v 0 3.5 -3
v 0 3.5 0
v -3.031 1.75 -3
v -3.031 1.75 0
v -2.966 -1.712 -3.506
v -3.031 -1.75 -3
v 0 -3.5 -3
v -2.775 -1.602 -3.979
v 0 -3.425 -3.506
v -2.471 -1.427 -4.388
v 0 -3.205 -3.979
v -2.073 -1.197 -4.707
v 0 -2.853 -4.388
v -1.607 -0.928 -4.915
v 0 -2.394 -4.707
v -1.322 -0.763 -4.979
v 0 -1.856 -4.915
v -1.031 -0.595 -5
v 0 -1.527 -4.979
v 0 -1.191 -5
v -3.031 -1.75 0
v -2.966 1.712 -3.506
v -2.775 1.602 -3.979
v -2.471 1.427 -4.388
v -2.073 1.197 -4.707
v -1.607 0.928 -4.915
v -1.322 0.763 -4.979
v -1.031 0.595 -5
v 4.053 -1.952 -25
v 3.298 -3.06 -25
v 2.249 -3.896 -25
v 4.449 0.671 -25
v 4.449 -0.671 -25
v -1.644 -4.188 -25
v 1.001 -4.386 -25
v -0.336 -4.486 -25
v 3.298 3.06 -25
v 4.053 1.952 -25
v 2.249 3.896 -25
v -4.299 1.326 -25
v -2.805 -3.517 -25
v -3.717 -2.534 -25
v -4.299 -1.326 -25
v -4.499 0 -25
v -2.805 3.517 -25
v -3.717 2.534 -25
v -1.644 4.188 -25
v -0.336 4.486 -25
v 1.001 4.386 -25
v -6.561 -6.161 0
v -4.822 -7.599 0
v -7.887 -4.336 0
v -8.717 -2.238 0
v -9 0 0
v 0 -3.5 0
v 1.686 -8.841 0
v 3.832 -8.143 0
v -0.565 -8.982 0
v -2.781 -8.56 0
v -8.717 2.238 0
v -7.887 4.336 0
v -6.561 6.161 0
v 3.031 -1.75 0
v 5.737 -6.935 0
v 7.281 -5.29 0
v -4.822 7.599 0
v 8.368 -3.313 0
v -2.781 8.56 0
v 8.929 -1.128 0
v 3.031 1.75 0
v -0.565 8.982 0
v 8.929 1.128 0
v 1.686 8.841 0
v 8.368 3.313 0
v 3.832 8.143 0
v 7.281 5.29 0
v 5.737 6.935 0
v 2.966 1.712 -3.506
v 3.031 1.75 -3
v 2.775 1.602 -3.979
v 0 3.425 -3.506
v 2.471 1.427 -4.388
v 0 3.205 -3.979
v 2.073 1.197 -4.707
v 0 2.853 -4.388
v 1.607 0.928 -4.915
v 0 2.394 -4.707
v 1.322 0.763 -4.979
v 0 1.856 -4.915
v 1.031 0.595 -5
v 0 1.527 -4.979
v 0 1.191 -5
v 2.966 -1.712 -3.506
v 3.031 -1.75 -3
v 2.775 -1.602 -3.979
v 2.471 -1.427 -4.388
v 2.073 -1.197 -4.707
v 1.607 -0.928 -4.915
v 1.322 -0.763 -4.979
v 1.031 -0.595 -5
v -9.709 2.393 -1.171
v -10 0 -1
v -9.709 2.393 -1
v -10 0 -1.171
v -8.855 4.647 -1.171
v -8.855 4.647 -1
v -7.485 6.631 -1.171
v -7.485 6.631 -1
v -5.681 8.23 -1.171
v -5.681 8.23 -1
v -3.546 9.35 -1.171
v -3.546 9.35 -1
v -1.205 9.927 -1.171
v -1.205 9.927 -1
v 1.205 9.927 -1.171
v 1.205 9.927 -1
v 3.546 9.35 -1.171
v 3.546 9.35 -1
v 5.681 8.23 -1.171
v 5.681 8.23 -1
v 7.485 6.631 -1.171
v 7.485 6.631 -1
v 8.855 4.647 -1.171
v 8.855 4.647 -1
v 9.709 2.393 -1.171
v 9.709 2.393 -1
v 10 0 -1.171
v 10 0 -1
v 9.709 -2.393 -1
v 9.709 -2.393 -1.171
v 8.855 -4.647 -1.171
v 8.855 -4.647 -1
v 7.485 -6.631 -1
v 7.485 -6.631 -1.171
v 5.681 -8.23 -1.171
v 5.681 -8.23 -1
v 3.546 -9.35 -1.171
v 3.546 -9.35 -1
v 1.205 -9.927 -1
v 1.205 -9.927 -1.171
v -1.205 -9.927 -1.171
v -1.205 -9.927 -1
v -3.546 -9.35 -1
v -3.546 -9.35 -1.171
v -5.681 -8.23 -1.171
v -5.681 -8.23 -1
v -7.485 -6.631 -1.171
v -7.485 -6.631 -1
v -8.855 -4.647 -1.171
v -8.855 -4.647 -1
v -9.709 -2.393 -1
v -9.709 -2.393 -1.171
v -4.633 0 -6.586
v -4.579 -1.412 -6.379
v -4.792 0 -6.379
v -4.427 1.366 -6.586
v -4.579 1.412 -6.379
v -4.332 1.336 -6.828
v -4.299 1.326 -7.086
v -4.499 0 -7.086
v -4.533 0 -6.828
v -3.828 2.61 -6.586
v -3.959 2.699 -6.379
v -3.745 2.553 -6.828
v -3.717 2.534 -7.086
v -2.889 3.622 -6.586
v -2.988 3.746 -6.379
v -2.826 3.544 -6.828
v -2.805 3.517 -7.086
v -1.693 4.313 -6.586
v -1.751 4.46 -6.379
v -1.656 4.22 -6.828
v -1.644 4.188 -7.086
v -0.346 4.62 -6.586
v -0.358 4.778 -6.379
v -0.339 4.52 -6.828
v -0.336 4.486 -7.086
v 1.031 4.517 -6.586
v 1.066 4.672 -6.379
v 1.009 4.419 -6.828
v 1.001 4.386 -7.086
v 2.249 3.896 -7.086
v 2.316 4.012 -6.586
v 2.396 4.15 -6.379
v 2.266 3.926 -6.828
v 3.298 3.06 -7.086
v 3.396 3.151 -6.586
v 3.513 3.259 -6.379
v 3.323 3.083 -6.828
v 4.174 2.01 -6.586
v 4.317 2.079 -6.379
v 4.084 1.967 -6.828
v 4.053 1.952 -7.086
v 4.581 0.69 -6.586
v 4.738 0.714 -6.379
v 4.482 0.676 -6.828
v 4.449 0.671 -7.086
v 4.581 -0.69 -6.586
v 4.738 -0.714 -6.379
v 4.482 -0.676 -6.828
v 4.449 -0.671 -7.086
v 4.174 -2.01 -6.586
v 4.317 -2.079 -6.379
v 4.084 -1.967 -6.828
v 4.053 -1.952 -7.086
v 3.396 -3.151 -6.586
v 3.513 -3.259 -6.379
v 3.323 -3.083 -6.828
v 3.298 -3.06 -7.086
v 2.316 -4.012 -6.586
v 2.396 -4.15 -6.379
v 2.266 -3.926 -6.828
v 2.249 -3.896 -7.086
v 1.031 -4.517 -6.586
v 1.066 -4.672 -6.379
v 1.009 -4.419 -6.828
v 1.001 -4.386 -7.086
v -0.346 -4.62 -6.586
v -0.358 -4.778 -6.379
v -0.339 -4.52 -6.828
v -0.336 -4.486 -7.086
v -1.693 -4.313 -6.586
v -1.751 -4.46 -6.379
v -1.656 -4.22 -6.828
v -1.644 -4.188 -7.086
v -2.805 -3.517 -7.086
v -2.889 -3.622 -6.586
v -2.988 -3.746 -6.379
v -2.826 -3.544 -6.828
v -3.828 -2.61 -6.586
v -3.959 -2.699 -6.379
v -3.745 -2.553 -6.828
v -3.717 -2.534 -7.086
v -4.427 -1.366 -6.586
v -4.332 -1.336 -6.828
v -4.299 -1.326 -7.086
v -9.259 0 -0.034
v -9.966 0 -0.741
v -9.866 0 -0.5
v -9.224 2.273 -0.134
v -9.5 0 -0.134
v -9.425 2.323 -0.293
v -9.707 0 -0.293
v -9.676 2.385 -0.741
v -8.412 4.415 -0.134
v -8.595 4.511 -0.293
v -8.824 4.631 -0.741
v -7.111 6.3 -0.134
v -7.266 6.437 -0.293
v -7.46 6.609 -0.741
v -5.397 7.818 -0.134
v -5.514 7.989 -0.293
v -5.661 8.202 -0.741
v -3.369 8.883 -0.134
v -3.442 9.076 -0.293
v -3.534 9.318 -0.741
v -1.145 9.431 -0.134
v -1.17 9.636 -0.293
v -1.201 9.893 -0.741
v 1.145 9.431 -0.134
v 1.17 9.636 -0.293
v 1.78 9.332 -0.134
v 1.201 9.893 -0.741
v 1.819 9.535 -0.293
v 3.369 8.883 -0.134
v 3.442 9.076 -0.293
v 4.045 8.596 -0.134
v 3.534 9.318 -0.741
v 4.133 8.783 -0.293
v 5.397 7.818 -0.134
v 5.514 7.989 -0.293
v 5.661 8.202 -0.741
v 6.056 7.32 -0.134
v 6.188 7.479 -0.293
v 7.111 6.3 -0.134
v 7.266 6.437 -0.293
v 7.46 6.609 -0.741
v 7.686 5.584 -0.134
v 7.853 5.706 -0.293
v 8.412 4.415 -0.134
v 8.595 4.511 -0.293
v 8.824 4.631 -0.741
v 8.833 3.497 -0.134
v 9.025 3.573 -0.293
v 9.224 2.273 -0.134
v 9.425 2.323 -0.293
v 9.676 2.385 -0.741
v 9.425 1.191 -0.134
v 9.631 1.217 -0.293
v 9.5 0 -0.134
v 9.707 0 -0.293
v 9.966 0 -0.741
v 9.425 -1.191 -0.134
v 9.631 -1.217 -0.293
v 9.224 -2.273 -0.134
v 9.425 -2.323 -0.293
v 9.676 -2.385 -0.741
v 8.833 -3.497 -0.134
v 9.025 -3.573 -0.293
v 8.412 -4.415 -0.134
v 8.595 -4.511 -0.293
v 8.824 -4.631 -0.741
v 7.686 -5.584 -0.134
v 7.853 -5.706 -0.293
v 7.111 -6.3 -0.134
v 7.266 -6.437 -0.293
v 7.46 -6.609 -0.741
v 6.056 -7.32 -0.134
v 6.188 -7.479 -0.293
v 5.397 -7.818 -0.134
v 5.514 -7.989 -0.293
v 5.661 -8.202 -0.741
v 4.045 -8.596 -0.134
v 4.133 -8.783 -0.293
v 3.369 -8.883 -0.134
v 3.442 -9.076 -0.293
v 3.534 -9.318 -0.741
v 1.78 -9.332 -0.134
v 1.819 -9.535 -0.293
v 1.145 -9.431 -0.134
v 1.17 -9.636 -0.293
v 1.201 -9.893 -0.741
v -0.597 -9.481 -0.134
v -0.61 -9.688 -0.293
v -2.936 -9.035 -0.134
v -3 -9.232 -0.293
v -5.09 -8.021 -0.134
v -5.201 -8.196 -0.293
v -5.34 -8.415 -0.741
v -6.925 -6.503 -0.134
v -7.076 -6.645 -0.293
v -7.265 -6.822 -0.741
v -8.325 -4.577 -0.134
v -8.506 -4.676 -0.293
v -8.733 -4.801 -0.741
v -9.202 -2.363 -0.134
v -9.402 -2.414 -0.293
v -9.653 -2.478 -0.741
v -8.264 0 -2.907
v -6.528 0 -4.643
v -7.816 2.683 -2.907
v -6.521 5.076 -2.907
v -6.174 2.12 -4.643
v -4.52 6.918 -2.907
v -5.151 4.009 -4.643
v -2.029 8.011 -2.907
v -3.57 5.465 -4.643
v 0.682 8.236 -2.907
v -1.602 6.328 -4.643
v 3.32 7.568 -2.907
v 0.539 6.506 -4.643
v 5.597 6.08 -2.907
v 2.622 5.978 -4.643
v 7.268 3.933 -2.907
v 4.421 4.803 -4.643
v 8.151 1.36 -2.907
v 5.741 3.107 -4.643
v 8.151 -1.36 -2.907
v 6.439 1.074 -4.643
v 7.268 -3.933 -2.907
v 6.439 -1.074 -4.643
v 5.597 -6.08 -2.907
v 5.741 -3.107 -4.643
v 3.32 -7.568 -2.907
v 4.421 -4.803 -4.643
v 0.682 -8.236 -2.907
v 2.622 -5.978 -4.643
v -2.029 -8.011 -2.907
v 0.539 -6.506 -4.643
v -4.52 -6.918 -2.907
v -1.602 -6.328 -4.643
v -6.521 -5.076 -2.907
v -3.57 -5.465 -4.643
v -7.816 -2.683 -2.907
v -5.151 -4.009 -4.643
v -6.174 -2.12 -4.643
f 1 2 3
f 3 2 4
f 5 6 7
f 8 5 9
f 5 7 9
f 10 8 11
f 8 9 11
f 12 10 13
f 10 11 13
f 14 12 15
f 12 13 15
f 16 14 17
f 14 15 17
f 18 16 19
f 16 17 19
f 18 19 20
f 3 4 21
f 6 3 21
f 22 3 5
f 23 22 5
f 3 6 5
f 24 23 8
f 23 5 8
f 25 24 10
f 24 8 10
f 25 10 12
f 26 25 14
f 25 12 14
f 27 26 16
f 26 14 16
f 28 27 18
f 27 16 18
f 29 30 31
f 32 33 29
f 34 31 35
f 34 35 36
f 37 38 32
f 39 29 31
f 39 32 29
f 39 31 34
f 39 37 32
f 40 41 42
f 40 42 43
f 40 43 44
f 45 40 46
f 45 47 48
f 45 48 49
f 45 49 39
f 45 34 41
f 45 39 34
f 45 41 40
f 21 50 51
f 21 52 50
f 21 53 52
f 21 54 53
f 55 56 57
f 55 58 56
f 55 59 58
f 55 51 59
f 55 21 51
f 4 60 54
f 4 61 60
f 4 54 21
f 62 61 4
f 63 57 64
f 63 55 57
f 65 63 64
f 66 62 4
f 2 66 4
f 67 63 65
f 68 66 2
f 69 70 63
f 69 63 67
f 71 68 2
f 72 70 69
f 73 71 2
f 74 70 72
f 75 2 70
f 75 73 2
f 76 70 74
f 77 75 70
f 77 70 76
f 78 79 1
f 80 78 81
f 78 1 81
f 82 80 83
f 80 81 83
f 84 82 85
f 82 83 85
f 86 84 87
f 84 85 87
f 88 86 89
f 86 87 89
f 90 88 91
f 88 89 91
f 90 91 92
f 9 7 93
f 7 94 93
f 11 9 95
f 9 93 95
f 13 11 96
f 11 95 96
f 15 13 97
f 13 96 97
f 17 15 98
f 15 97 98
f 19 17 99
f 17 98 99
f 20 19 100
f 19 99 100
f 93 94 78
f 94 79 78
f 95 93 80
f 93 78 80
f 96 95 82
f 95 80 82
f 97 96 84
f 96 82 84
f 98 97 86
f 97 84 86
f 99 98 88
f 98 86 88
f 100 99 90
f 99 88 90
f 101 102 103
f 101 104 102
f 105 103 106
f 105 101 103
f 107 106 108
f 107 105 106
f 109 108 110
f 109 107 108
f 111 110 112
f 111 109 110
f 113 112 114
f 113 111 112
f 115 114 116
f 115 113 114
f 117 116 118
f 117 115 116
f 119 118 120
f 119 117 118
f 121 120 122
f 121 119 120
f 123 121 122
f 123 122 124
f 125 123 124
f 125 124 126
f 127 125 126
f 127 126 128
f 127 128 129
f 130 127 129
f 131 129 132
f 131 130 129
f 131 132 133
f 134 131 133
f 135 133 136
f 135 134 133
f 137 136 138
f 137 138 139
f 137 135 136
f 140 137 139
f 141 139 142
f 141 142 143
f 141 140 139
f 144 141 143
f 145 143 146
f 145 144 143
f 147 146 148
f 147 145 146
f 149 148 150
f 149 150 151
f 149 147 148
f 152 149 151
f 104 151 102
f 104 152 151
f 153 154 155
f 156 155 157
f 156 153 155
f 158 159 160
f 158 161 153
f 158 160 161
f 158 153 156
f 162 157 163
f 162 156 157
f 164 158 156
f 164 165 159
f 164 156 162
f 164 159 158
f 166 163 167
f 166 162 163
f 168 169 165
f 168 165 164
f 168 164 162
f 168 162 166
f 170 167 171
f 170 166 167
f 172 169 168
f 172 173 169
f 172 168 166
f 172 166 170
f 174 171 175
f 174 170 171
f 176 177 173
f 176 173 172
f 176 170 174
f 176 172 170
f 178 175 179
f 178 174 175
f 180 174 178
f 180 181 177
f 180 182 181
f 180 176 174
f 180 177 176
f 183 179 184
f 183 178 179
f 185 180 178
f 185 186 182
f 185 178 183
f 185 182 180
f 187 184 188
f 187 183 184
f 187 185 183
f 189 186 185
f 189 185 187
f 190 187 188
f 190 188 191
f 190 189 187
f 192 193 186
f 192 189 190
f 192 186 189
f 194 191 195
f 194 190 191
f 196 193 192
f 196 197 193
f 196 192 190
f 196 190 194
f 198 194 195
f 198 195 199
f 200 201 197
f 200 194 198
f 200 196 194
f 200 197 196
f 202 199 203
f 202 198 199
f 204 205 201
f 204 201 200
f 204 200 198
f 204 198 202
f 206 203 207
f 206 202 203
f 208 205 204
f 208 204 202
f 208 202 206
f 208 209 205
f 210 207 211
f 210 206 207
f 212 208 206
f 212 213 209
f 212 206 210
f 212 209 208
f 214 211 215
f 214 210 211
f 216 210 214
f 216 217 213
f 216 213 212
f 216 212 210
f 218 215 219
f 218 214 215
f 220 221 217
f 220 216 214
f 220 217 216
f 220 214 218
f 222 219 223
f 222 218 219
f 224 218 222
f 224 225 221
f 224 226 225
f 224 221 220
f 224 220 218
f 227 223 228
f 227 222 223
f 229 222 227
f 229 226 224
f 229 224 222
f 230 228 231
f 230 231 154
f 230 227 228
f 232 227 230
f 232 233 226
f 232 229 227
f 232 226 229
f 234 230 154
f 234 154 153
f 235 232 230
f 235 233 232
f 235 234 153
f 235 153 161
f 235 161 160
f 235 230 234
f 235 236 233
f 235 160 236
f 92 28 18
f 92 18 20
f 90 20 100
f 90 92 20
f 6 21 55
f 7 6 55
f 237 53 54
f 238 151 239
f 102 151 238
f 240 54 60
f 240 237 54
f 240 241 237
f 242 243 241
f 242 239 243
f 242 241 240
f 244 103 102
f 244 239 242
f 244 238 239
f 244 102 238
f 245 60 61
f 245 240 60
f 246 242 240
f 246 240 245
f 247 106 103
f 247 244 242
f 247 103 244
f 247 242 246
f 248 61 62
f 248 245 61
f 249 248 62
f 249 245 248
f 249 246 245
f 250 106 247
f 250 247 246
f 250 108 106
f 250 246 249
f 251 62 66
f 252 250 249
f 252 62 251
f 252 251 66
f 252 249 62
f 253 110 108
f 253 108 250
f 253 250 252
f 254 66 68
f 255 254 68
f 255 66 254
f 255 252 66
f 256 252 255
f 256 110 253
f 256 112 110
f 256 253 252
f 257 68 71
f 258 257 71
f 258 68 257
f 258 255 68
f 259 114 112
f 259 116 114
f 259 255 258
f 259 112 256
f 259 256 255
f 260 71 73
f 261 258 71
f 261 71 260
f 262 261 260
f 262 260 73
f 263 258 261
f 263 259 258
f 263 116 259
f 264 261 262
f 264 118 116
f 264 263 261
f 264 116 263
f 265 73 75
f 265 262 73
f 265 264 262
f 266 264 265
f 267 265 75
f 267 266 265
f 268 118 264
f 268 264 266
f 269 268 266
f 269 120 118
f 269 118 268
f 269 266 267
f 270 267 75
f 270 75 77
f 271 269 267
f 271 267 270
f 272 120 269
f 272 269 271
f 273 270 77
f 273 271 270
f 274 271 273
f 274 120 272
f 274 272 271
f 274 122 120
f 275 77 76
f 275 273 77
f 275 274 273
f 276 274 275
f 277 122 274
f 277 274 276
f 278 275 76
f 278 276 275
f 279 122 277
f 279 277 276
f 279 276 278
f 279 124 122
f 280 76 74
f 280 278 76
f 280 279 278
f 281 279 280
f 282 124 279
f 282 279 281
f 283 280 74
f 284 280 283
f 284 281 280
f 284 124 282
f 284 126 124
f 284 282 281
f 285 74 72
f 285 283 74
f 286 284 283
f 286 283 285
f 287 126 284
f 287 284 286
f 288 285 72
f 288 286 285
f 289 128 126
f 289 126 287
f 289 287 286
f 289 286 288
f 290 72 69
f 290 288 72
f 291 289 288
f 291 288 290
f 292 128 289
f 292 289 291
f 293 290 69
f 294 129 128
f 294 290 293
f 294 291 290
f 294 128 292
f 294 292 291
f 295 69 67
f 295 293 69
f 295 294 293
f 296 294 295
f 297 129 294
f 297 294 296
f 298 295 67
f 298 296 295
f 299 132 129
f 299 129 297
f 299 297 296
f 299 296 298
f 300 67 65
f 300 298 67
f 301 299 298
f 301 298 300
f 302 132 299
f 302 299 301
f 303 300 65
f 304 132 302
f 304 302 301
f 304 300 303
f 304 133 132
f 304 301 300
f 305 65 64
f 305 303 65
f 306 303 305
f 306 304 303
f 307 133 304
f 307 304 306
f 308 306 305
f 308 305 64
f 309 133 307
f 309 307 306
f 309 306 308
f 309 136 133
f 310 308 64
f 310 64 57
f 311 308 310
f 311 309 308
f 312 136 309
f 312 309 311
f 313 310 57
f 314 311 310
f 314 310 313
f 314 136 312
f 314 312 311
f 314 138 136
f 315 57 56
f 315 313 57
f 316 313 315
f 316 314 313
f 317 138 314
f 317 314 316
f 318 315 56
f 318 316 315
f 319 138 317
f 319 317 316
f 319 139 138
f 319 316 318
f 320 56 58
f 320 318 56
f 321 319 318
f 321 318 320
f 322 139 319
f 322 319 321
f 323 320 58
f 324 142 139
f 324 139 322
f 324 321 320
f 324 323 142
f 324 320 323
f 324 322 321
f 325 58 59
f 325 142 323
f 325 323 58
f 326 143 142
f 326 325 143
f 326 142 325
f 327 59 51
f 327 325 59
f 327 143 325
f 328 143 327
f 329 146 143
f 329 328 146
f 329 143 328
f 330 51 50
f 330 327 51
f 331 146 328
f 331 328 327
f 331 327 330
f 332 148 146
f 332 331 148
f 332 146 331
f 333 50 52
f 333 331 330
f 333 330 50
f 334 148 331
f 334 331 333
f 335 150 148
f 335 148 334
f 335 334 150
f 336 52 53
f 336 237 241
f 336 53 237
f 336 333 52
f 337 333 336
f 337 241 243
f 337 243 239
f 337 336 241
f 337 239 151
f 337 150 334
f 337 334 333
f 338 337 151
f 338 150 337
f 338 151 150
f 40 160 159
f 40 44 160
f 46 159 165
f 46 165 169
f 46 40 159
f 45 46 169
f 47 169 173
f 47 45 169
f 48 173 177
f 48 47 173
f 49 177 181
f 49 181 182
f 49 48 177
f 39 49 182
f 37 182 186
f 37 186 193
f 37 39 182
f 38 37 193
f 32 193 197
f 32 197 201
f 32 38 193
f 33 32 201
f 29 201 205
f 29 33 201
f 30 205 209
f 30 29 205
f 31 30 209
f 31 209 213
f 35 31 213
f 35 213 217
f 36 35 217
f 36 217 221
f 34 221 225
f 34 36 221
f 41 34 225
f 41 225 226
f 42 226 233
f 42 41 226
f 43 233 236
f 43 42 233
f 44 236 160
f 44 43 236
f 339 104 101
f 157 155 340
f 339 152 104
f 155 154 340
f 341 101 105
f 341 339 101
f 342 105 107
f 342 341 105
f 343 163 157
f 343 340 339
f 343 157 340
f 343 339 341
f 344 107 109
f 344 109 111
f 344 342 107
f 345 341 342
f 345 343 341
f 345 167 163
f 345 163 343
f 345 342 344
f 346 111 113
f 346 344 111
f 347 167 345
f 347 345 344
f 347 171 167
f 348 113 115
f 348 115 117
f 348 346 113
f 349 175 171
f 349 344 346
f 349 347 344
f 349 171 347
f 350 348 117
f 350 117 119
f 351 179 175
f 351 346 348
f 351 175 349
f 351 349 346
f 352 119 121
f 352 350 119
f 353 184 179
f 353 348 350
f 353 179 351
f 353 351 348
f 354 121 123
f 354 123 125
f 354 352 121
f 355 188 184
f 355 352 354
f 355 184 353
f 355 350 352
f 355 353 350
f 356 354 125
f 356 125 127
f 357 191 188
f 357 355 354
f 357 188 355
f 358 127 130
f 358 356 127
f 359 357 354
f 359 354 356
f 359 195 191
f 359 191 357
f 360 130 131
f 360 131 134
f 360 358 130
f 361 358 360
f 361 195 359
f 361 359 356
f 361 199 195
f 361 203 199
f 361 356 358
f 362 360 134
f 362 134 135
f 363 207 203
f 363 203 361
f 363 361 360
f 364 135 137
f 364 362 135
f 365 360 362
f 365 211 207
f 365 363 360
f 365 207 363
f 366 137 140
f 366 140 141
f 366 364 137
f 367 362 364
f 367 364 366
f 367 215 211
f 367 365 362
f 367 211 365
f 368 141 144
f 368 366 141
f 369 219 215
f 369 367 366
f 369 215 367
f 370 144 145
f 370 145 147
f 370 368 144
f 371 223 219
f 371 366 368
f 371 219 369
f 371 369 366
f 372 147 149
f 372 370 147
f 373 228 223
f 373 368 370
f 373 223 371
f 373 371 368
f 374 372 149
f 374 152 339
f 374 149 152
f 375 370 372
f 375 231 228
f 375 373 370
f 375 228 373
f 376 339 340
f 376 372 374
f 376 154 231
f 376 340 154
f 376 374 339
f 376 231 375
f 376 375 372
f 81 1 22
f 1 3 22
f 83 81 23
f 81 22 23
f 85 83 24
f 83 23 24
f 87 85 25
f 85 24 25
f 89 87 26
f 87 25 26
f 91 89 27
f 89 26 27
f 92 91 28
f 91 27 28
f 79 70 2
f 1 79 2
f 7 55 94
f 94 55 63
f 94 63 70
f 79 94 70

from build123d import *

# Parameters (mm, degrees)
F3_DEPTH = 5
F4_R     = 2


with BuildPart() as f1:
    # F0 (on Front) → F1 (revolve)
    with BuildSketch(Plane.XZ):
        with BuildLine():
            Line((0, -25), (0, 0))
            Line((0, 0), (-9, 0))
            ThreePointArc((-9, 0), (-9.707107, -0.292893), (-10, -1))
            Line((-10, -1), (-10, -1.17097))
            Line((-10, -1.17097), (-4.791713, -6.379256))
            ThreePointArc((-4.791713, -6.379256), (-4.57494, -6.70368), (-4.49882, -7.086363))
            Line((-4.49882, -7.086363), (-4.49882, -25))
            Line((-4.49882, -25), (0, -25))
        make_face()
    revolve(axis=Axis((0, 0, -11.455107), (0, 0, -1)))

    # F2 (on face) → F3 (cut)
    with BuildSketch(Plane.XY):
        Polygon((-3.031089, -1.75), (0, -3.5), (3.031089, -1.75), (3.031089, 1.75), (0, 3.5), (-3.031089, 1.75), align=None)
    extrude(amount=-F3_DEPTH, mode=Mode.SUBTRACT)

    # F4
    f4_edges = [f1.edges().sort_by_distance(p)[0] for p in [
        (1.515544, -2.625, -5),
        (3.031089, 0, -5),
        (-1.515544, -2.625, -5),
        (-3.031089, 0, -5),
        (-1.515544, 2.625, -5),
        (1.515544, 2.625, -5),
    ]]
    fillet(f4_edges, radius=F4_R)


solid = f1.part
